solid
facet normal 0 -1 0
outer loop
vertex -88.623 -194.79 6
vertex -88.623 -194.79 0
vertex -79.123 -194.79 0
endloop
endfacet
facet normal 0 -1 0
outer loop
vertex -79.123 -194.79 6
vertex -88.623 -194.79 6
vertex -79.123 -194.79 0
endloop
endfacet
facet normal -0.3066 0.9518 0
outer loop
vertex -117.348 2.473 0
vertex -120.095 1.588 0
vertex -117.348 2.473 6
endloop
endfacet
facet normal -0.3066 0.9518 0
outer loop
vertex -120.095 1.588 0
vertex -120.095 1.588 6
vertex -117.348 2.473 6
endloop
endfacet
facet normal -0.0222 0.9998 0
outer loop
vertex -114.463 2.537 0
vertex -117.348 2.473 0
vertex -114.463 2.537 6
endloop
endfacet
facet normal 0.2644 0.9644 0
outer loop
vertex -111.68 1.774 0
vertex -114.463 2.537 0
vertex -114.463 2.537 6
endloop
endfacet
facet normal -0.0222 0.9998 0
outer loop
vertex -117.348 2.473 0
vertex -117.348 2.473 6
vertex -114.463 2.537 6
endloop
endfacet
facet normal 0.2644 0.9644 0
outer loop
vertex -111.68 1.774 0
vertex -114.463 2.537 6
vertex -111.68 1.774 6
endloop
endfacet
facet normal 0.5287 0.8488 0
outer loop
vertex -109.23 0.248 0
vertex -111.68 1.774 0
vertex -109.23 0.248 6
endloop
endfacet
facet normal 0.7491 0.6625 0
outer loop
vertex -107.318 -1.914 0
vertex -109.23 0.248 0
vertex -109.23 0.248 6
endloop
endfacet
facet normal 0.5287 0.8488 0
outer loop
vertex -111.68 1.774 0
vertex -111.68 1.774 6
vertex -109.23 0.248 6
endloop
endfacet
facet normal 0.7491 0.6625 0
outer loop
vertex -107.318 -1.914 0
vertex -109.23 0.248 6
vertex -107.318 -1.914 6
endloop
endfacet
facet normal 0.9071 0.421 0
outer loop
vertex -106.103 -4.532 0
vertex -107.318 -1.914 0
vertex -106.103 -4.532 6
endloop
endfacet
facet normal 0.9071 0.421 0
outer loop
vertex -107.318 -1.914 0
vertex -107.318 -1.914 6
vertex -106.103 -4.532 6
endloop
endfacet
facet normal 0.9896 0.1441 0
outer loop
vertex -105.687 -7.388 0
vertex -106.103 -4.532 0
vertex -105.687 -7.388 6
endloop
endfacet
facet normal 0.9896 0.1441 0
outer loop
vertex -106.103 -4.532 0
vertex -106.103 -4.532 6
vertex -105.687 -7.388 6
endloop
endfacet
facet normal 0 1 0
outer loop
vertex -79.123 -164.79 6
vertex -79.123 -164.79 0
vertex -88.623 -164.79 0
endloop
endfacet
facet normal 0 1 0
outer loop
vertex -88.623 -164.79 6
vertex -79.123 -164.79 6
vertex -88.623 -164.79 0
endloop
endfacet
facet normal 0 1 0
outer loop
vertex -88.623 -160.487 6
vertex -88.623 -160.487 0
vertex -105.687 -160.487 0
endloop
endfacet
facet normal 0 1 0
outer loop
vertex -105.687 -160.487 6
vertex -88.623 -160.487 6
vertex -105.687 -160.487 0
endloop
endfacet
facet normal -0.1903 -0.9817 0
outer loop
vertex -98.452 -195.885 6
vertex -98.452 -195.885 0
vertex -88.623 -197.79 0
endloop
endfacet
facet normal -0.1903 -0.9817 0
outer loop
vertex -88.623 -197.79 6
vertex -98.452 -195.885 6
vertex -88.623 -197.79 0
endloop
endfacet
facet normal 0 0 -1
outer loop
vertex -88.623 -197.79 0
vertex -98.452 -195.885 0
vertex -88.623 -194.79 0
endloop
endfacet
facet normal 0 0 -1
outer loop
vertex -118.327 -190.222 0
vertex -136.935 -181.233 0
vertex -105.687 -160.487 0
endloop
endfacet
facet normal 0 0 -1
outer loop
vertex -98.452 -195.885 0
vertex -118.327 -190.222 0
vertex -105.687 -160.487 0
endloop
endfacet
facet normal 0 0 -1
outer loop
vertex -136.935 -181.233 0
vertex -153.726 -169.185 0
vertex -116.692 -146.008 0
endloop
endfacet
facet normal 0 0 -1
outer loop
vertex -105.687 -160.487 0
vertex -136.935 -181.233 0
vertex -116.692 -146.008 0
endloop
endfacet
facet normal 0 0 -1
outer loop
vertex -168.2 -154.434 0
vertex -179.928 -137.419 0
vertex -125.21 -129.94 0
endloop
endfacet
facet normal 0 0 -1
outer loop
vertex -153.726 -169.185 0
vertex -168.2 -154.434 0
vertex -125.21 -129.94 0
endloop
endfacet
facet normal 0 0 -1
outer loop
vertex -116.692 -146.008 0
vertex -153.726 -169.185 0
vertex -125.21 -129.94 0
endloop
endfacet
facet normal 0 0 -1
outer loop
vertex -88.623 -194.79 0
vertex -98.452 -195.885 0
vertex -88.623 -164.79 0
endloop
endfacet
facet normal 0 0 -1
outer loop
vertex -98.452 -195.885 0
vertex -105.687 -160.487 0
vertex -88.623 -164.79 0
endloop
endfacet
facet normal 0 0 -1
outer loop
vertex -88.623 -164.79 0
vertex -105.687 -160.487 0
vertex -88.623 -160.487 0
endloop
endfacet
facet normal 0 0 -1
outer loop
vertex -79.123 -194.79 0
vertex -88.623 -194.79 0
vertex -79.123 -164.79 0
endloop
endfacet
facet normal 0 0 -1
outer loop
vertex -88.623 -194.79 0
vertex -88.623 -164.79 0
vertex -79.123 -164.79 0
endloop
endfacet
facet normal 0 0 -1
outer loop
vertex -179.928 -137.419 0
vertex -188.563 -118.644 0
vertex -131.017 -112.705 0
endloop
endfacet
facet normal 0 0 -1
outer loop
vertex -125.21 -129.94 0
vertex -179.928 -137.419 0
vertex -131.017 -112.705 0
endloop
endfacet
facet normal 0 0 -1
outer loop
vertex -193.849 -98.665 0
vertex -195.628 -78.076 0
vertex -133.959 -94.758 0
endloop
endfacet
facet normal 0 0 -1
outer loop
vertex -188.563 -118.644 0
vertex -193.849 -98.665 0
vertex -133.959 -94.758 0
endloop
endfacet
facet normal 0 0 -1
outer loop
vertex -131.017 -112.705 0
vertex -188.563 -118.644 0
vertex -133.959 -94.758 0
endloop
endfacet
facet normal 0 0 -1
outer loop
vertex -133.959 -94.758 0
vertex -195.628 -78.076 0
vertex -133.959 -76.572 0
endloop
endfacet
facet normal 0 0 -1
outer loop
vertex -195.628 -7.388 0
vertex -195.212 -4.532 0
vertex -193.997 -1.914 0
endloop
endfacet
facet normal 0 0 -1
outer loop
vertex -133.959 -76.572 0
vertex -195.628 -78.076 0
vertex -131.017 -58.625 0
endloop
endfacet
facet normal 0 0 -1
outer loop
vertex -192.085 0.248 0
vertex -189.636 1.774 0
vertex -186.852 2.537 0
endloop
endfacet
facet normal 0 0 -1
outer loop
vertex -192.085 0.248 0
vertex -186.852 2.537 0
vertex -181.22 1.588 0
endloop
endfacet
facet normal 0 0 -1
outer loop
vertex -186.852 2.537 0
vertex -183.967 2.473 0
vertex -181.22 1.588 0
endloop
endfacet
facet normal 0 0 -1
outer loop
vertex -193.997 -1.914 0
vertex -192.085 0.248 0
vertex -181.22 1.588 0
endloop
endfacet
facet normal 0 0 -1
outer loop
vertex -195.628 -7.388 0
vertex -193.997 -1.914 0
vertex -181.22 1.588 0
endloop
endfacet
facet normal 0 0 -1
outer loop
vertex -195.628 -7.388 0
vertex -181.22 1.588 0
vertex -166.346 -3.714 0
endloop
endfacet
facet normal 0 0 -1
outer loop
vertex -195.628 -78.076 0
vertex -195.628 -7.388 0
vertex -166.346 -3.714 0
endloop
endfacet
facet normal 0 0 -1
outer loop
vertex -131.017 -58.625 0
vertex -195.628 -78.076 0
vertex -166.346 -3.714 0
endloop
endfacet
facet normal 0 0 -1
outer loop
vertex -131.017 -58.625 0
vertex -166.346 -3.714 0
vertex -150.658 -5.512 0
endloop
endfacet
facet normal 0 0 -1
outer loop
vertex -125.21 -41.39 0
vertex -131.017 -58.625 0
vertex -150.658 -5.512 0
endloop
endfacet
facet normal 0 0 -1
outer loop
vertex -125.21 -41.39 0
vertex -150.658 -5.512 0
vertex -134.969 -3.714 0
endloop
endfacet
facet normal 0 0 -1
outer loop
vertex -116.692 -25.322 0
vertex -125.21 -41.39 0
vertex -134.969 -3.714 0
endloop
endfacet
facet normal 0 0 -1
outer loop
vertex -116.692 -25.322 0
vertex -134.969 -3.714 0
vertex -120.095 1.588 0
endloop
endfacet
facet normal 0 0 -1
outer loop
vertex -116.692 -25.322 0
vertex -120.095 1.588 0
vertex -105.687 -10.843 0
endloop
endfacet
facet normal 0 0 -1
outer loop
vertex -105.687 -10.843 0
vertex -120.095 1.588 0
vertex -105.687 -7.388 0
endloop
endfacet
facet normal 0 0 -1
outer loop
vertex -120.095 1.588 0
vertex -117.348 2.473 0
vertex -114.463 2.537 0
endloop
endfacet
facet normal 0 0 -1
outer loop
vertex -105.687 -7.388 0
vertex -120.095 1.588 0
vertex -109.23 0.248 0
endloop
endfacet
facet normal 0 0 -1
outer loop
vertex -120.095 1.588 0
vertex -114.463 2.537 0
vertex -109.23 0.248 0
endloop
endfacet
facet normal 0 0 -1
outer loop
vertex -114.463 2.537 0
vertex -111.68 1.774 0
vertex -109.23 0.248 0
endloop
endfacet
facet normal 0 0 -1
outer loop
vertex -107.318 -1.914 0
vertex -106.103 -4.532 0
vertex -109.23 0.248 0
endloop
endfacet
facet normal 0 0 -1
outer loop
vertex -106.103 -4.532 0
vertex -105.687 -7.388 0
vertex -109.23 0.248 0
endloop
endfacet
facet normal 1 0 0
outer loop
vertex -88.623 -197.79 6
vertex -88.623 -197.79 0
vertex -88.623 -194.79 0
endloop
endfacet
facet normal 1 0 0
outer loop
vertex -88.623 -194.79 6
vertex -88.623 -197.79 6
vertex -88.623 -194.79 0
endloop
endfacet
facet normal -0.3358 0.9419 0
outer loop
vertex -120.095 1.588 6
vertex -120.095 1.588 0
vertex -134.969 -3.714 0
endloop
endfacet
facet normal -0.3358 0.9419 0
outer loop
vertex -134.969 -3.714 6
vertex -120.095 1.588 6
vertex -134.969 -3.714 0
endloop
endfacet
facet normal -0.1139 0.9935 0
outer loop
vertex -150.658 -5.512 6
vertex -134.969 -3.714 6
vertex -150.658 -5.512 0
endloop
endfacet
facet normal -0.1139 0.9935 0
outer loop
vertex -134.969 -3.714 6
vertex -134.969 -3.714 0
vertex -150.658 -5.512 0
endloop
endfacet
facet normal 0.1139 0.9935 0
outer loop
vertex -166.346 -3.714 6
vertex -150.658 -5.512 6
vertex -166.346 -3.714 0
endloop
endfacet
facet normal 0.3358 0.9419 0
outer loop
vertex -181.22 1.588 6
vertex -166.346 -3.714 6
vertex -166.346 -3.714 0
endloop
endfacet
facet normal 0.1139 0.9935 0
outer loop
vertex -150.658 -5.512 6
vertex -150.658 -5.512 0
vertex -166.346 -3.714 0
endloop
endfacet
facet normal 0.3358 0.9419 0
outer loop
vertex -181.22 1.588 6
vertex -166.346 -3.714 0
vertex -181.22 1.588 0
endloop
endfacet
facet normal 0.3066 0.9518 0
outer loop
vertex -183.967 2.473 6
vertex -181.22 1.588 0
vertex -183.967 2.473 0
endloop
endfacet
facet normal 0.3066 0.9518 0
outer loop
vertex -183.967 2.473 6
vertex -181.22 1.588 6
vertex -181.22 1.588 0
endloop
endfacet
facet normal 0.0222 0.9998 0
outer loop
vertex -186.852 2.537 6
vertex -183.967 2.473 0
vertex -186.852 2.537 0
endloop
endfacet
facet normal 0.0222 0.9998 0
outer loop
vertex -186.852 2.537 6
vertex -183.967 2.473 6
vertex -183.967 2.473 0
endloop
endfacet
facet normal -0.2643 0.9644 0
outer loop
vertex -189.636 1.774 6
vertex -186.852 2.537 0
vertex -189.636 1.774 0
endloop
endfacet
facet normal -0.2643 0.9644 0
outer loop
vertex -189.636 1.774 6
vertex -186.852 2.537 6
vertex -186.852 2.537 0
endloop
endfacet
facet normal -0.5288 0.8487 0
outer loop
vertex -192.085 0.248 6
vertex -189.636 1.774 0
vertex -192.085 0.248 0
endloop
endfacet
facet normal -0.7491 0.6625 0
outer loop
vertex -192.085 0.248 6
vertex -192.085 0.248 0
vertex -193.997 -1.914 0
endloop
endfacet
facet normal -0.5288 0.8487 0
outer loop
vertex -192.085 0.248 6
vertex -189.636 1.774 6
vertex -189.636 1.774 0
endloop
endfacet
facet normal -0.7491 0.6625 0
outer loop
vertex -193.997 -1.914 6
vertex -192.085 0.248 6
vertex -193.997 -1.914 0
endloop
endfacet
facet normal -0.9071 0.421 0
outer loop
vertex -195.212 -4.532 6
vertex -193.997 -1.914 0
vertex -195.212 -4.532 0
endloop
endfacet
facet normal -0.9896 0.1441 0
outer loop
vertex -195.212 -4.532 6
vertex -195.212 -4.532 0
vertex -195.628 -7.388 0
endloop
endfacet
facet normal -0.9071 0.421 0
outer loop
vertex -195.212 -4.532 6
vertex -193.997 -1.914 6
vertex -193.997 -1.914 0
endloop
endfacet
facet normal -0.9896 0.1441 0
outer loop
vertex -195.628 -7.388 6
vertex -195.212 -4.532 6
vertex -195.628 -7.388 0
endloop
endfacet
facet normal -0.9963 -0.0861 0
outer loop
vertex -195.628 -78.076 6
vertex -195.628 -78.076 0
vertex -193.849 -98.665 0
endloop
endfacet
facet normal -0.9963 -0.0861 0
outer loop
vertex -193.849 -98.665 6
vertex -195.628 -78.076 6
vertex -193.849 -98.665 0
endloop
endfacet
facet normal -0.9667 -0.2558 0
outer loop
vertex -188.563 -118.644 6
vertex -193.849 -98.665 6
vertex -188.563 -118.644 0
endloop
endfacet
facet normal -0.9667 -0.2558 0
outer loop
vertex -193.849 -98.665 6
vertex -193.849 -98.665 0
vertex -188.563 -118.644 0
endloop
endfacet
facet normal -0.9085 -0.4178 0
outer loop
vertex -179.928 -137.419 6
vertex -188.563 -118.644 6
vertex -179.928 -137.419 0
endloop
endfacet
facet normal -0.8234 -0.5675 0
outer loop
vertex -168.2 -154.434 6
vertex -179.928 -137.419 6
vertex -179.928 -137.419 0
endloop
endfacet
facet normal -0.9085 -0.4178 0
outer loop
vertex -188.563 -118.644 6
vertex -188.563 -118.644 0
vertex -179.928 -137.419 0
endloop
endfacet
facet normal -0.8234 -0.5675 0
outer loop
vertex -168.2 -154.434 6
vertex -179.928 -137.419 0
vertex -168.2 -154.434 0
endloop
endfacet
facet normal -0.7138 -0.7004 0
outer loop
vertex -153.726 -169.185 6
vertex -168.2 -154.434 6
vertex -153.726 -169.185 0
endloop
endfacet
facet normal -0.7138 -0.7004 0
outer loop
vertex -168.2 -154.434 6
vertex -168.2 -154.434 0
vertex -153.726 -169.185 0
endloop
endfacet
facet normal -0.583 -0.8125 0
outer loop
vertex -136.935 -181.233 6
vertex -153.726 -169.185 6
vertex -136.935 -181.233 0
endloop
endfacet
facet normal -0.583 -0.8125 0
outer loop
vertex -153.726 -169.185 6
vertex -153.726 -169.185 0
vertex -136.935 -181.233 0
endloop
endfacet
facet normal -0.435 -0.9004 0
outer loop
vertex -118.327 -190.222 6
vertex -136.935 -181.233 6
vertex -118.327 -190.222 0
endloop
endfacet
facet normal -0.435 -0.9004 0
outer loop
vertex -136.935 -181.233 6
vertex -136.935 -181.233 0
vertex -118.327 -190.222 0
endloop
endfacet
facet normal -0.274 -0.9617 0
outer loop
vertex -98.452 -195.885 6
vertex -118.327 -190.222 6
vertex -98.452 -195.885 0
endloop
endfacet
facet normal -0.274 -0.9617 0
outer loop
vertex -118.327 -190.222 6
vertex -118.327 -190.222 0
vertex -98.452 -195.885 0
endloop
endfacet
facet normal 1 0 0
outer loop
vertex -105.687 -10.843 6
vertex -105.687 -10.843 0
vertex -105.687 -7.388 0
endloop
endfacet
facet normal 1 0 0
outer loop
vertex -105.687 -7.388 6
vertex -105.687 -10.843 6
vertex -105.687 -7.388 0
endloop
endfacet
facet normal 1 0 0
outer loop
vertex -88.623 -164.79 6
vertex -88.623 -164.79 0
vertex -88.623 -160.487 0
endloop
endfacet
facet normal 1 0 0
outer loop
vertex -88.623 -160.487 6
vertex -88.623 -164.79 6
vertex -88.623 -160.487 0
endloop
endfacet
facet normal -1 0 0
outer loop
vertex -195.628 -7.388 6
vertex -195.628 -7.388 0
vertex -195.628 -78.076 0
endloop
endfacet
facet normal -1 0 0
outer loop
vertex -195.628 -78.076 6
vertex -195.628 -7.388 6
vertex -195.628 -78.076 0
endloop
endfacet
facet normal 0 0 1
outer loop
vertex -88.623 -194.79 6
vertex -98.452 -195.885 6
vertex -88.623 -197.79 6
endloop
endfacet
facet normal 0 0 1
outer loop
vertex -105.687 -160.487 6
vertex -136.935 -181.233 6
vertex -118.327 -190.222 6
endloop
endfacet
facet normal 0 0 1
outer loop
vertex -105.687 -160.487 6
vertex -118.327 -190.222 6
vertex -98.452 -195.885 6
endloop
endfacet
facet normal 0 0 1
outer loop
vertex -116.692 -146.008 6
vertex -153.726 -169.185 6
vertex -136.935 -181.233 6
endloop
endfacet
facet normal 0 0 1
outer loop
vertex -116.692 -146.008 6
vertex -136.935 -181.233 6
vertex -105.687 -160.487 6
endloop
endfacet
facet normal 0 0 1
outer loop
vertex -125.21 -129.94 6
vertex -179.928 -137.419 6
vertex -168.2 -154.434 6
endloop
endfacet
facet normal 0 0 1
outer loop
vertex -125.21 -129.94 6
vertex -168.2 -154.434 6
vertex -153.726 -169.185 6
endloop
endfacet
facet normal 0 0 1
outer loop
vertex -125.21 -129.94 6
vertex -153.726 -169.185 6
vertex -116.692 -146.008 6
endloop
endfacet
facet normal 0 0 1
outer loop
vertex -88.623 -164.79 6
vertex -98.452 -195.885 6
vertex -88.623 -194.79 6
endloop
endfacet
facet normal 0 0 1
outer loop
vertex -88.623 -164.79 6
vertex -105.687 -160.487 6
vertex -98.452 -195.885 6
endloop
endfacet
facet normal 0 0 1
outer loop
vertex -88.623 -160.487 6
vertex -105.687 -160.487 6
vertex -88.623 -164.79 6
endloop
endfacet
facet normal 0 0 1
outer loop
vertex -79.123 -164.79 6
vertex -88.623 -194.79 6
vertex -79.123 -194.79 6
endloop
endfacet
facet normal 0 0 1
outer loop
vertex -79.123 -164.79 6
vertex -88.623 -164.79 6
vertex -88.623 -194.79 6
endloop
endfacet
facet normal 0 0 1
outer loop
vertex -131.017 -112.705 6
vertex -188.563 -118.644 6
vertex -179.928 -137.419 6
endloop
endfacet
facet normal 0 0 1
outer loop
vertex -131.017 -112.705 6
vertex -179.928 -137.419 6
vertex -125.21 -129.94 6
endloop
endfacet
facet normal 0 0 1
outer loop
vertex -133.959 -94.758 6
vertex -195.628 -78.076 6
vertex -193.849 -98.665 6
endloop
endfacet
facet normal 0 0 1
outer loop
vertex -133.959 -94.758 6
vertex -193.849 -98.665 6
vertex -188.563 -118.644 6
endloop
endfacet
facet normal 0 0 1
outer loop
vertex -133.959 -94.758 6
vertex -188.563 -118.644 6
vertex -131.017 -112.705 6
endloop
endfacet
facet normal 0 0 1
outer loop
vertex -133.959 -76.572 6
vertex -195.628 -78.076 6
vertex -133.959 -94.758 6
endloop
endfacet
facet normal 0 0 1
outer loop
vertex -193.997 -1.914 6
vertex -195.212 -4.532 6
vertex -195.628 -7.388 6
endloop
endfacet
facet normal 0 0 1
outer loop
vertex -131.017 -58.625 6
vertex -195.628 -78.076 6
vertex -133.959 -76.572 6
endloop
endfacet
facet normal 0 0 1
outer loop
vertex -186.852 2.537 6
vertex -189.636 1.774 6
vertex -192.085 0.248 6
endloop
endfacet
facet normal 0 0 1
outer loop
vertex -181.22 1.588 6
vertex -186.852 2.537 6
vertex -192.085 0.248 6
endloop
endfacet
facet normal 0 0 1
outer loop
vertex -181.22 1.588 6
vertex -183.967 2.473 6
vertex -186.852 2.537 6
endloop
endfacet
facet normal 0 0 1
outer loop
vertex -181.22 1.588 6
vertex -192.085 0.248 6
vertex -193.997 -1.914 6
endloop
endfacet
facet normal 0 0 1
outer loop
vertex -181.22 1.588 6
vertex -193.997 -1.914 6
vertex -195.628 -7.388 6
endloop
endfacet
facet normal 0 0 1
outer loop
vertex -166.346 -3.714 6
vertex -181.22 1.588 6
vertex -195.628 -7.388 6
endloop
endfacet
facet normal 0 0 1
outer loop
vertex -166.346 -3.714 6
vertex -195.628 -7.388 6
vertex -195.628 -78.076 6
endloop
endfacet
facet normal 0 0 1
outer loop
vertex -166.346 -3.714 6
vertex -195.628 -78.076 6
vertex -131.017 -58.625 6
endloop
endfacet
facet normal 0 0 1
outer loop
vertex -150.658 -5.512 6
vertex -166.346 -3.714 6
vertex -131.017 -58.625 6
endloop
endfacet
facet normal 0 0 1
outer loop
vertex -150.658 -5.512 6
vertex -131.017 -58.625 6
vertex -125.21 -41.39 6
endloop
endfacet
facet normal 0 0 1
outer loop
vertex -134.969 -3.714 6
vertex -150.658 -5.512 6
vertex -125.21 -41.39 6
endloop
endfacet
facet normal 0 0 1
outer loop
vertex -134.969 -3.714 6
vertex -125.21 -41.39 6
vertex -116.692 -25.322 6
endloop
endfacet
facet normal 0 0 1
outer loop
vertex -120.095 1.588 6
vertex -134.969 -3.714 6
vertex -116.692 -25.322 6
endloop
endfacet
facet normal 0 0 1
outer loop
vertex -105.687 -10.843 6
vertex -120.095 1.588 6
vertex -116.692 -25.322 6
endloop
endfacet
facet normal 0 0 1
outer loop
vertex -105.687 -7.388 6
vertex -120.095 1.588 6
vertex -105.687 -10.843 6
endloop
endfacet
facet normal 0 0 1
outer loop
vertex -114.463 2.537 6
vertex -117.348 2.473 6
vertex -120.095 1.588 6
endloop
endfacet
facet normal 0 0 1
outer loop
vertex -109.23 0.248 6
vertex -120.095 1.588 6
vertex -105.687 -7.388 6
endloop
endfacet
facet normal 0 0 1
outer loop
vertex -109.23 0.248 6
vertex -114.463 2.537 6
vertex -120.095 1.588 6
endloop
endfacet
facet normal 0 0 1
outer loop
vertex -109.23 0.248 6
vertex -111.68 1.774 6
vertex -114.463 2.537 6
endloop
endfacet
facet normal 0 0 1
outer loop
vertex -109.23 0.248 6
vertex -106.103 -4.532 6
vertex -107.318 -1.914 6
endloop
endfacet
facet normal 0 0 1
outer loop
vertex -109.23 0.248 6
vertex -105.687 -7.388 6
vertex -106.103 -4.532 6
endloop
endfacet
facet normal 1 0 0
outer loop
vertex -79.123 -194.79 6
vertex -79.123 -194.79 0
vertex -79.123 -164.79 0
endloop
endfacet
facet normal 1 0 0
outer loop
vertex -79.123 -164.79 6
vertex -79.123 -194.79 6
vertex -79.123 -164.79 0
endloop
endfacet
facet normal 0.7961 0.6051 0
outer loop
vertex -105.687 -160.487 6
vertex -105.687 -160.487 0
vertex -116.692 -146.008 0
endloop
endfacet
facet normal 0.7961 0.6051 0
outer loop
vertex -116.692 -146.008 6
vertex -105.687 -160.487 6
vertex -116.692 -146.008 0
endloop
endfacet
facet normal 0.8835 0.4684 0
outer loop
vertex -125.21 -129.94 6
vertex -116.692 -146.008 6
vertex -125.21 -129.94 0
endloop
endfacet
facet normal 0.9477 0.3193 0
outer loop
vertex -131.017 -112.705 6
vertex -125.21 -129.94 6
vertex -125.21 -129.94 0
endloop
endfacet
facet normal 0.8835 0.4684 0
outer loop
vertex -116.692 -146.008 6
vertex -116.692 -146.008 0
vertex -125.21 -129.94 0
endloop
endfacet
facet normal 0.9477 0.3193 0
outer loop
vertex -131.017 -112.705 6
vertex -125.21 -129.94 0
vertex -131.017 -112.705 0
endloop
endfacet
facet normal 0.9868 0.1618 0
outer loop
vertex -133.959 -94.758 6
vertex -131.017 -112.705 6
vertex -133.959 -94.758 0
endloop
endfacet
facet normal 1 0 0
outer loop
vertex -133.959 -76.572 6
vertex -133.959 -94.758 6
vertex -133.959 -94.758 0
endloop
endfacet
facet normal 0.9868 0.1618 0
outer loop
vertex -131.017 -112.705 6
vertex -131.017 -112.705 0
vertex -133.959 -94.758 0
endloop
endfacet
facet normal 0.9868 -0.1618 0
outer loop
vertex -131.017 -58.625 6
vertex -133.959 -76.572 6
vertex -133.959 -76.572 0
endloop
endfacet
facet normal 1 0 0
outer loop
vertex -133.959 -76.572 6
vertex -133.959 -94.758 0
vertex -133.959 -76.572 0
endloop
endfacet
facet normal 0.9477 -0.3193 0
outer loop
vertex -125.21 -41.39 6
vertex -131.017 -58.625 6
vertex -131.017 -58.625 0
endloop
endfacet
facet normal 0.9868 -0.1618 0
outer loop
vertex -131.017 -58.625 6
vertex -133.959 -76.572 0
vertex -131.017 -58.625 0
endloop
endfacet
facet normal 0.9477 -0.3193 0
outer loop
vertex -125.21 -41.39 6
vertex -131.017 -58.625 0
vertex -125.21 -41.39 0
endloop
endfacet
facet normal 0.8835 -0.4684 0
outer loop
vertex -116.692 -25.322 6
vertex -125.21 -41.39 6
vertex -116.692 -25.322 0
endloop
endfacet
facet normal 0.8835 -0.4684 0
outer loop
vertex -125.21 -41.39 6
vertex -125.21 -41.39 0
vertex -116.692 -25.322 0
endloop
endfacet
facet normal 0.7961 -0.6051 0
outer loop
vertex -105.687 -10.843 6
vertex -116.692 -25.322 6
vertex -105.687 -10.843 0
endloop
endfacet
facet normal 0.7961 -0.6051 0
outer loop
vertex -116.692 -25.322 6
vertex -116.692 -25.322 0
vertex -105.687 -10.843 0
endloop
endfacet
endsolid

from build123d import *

# Parameters (mm, degrees)
BOSS_EXTRUDE1_DEPTH = 6
FILLET1_R           = 10
FILLET2_R           = 10


with BuildPart() as part:
    # Sketch1 → Boss-Extrude1 (new body)
    with BuildSketch(Plane.XY):
        with BuildLine():
            Line((-79.123154231, -194.789726066), (-79.123154231, -164.789726066))
            Line((-79.123154231, -164.789726066), (-88.623154231, -164.789726066))
            Line((-88.623154231, -164.789726066), (-88.623154231, -160.48699252))
            Line((-88.623154231, -160.48699252), (-105.686834952, -160.48699252))
            ThreePointArc((-105.686834952, -160.48699252), (-134.328154399, -85.664912136), (-105.686834952, -10.842831751))
            Line((-105.686834952, -10.842831751), (-105.686834952, 11.052996518))
            ThreePointArc((-105.686834952, 11.052996518), (-150.657550595, -5.512129368), (-195.628266239, 11.052996518))
            Line((-195.628266239, 11.052996518), (-195.628266239, -78.076028691))
            ThreePointArc((-195.628266239, -78.076028691), (-168.199517459, -154.434154962), (-98.45220878, -195.885483519))
            Line((-98.45220878, -195.885483519), (-88.623154231, -197.789726066))
            Line((-88.623154231, -197.789726066), (-88.623154231, -194.789726066))
            Line((-88.623154231, -194.789726066), (-79.123154231, -194.789726066))
        make_face()
    extrude(amount=BOSS_EXTRUDE1_DEPTH)

    # Fillet1
    fillet1_edges = [part.edges().sort_by_distance(p)[0] for p in [
        (-195.628266239, 11.052996518, 3),
    ]]
    fillet(fillet1_edges, radius=FILLET1_R)

    # Fillet2
    fillet2_edges = [part.edges().sort_by_distance(p)[0] for p in [
        (-105.686834952, 11.052996518, 3),
    ]]
    fillet(fillet2_edges, radius=FILLET2_R)


solid = part.part
